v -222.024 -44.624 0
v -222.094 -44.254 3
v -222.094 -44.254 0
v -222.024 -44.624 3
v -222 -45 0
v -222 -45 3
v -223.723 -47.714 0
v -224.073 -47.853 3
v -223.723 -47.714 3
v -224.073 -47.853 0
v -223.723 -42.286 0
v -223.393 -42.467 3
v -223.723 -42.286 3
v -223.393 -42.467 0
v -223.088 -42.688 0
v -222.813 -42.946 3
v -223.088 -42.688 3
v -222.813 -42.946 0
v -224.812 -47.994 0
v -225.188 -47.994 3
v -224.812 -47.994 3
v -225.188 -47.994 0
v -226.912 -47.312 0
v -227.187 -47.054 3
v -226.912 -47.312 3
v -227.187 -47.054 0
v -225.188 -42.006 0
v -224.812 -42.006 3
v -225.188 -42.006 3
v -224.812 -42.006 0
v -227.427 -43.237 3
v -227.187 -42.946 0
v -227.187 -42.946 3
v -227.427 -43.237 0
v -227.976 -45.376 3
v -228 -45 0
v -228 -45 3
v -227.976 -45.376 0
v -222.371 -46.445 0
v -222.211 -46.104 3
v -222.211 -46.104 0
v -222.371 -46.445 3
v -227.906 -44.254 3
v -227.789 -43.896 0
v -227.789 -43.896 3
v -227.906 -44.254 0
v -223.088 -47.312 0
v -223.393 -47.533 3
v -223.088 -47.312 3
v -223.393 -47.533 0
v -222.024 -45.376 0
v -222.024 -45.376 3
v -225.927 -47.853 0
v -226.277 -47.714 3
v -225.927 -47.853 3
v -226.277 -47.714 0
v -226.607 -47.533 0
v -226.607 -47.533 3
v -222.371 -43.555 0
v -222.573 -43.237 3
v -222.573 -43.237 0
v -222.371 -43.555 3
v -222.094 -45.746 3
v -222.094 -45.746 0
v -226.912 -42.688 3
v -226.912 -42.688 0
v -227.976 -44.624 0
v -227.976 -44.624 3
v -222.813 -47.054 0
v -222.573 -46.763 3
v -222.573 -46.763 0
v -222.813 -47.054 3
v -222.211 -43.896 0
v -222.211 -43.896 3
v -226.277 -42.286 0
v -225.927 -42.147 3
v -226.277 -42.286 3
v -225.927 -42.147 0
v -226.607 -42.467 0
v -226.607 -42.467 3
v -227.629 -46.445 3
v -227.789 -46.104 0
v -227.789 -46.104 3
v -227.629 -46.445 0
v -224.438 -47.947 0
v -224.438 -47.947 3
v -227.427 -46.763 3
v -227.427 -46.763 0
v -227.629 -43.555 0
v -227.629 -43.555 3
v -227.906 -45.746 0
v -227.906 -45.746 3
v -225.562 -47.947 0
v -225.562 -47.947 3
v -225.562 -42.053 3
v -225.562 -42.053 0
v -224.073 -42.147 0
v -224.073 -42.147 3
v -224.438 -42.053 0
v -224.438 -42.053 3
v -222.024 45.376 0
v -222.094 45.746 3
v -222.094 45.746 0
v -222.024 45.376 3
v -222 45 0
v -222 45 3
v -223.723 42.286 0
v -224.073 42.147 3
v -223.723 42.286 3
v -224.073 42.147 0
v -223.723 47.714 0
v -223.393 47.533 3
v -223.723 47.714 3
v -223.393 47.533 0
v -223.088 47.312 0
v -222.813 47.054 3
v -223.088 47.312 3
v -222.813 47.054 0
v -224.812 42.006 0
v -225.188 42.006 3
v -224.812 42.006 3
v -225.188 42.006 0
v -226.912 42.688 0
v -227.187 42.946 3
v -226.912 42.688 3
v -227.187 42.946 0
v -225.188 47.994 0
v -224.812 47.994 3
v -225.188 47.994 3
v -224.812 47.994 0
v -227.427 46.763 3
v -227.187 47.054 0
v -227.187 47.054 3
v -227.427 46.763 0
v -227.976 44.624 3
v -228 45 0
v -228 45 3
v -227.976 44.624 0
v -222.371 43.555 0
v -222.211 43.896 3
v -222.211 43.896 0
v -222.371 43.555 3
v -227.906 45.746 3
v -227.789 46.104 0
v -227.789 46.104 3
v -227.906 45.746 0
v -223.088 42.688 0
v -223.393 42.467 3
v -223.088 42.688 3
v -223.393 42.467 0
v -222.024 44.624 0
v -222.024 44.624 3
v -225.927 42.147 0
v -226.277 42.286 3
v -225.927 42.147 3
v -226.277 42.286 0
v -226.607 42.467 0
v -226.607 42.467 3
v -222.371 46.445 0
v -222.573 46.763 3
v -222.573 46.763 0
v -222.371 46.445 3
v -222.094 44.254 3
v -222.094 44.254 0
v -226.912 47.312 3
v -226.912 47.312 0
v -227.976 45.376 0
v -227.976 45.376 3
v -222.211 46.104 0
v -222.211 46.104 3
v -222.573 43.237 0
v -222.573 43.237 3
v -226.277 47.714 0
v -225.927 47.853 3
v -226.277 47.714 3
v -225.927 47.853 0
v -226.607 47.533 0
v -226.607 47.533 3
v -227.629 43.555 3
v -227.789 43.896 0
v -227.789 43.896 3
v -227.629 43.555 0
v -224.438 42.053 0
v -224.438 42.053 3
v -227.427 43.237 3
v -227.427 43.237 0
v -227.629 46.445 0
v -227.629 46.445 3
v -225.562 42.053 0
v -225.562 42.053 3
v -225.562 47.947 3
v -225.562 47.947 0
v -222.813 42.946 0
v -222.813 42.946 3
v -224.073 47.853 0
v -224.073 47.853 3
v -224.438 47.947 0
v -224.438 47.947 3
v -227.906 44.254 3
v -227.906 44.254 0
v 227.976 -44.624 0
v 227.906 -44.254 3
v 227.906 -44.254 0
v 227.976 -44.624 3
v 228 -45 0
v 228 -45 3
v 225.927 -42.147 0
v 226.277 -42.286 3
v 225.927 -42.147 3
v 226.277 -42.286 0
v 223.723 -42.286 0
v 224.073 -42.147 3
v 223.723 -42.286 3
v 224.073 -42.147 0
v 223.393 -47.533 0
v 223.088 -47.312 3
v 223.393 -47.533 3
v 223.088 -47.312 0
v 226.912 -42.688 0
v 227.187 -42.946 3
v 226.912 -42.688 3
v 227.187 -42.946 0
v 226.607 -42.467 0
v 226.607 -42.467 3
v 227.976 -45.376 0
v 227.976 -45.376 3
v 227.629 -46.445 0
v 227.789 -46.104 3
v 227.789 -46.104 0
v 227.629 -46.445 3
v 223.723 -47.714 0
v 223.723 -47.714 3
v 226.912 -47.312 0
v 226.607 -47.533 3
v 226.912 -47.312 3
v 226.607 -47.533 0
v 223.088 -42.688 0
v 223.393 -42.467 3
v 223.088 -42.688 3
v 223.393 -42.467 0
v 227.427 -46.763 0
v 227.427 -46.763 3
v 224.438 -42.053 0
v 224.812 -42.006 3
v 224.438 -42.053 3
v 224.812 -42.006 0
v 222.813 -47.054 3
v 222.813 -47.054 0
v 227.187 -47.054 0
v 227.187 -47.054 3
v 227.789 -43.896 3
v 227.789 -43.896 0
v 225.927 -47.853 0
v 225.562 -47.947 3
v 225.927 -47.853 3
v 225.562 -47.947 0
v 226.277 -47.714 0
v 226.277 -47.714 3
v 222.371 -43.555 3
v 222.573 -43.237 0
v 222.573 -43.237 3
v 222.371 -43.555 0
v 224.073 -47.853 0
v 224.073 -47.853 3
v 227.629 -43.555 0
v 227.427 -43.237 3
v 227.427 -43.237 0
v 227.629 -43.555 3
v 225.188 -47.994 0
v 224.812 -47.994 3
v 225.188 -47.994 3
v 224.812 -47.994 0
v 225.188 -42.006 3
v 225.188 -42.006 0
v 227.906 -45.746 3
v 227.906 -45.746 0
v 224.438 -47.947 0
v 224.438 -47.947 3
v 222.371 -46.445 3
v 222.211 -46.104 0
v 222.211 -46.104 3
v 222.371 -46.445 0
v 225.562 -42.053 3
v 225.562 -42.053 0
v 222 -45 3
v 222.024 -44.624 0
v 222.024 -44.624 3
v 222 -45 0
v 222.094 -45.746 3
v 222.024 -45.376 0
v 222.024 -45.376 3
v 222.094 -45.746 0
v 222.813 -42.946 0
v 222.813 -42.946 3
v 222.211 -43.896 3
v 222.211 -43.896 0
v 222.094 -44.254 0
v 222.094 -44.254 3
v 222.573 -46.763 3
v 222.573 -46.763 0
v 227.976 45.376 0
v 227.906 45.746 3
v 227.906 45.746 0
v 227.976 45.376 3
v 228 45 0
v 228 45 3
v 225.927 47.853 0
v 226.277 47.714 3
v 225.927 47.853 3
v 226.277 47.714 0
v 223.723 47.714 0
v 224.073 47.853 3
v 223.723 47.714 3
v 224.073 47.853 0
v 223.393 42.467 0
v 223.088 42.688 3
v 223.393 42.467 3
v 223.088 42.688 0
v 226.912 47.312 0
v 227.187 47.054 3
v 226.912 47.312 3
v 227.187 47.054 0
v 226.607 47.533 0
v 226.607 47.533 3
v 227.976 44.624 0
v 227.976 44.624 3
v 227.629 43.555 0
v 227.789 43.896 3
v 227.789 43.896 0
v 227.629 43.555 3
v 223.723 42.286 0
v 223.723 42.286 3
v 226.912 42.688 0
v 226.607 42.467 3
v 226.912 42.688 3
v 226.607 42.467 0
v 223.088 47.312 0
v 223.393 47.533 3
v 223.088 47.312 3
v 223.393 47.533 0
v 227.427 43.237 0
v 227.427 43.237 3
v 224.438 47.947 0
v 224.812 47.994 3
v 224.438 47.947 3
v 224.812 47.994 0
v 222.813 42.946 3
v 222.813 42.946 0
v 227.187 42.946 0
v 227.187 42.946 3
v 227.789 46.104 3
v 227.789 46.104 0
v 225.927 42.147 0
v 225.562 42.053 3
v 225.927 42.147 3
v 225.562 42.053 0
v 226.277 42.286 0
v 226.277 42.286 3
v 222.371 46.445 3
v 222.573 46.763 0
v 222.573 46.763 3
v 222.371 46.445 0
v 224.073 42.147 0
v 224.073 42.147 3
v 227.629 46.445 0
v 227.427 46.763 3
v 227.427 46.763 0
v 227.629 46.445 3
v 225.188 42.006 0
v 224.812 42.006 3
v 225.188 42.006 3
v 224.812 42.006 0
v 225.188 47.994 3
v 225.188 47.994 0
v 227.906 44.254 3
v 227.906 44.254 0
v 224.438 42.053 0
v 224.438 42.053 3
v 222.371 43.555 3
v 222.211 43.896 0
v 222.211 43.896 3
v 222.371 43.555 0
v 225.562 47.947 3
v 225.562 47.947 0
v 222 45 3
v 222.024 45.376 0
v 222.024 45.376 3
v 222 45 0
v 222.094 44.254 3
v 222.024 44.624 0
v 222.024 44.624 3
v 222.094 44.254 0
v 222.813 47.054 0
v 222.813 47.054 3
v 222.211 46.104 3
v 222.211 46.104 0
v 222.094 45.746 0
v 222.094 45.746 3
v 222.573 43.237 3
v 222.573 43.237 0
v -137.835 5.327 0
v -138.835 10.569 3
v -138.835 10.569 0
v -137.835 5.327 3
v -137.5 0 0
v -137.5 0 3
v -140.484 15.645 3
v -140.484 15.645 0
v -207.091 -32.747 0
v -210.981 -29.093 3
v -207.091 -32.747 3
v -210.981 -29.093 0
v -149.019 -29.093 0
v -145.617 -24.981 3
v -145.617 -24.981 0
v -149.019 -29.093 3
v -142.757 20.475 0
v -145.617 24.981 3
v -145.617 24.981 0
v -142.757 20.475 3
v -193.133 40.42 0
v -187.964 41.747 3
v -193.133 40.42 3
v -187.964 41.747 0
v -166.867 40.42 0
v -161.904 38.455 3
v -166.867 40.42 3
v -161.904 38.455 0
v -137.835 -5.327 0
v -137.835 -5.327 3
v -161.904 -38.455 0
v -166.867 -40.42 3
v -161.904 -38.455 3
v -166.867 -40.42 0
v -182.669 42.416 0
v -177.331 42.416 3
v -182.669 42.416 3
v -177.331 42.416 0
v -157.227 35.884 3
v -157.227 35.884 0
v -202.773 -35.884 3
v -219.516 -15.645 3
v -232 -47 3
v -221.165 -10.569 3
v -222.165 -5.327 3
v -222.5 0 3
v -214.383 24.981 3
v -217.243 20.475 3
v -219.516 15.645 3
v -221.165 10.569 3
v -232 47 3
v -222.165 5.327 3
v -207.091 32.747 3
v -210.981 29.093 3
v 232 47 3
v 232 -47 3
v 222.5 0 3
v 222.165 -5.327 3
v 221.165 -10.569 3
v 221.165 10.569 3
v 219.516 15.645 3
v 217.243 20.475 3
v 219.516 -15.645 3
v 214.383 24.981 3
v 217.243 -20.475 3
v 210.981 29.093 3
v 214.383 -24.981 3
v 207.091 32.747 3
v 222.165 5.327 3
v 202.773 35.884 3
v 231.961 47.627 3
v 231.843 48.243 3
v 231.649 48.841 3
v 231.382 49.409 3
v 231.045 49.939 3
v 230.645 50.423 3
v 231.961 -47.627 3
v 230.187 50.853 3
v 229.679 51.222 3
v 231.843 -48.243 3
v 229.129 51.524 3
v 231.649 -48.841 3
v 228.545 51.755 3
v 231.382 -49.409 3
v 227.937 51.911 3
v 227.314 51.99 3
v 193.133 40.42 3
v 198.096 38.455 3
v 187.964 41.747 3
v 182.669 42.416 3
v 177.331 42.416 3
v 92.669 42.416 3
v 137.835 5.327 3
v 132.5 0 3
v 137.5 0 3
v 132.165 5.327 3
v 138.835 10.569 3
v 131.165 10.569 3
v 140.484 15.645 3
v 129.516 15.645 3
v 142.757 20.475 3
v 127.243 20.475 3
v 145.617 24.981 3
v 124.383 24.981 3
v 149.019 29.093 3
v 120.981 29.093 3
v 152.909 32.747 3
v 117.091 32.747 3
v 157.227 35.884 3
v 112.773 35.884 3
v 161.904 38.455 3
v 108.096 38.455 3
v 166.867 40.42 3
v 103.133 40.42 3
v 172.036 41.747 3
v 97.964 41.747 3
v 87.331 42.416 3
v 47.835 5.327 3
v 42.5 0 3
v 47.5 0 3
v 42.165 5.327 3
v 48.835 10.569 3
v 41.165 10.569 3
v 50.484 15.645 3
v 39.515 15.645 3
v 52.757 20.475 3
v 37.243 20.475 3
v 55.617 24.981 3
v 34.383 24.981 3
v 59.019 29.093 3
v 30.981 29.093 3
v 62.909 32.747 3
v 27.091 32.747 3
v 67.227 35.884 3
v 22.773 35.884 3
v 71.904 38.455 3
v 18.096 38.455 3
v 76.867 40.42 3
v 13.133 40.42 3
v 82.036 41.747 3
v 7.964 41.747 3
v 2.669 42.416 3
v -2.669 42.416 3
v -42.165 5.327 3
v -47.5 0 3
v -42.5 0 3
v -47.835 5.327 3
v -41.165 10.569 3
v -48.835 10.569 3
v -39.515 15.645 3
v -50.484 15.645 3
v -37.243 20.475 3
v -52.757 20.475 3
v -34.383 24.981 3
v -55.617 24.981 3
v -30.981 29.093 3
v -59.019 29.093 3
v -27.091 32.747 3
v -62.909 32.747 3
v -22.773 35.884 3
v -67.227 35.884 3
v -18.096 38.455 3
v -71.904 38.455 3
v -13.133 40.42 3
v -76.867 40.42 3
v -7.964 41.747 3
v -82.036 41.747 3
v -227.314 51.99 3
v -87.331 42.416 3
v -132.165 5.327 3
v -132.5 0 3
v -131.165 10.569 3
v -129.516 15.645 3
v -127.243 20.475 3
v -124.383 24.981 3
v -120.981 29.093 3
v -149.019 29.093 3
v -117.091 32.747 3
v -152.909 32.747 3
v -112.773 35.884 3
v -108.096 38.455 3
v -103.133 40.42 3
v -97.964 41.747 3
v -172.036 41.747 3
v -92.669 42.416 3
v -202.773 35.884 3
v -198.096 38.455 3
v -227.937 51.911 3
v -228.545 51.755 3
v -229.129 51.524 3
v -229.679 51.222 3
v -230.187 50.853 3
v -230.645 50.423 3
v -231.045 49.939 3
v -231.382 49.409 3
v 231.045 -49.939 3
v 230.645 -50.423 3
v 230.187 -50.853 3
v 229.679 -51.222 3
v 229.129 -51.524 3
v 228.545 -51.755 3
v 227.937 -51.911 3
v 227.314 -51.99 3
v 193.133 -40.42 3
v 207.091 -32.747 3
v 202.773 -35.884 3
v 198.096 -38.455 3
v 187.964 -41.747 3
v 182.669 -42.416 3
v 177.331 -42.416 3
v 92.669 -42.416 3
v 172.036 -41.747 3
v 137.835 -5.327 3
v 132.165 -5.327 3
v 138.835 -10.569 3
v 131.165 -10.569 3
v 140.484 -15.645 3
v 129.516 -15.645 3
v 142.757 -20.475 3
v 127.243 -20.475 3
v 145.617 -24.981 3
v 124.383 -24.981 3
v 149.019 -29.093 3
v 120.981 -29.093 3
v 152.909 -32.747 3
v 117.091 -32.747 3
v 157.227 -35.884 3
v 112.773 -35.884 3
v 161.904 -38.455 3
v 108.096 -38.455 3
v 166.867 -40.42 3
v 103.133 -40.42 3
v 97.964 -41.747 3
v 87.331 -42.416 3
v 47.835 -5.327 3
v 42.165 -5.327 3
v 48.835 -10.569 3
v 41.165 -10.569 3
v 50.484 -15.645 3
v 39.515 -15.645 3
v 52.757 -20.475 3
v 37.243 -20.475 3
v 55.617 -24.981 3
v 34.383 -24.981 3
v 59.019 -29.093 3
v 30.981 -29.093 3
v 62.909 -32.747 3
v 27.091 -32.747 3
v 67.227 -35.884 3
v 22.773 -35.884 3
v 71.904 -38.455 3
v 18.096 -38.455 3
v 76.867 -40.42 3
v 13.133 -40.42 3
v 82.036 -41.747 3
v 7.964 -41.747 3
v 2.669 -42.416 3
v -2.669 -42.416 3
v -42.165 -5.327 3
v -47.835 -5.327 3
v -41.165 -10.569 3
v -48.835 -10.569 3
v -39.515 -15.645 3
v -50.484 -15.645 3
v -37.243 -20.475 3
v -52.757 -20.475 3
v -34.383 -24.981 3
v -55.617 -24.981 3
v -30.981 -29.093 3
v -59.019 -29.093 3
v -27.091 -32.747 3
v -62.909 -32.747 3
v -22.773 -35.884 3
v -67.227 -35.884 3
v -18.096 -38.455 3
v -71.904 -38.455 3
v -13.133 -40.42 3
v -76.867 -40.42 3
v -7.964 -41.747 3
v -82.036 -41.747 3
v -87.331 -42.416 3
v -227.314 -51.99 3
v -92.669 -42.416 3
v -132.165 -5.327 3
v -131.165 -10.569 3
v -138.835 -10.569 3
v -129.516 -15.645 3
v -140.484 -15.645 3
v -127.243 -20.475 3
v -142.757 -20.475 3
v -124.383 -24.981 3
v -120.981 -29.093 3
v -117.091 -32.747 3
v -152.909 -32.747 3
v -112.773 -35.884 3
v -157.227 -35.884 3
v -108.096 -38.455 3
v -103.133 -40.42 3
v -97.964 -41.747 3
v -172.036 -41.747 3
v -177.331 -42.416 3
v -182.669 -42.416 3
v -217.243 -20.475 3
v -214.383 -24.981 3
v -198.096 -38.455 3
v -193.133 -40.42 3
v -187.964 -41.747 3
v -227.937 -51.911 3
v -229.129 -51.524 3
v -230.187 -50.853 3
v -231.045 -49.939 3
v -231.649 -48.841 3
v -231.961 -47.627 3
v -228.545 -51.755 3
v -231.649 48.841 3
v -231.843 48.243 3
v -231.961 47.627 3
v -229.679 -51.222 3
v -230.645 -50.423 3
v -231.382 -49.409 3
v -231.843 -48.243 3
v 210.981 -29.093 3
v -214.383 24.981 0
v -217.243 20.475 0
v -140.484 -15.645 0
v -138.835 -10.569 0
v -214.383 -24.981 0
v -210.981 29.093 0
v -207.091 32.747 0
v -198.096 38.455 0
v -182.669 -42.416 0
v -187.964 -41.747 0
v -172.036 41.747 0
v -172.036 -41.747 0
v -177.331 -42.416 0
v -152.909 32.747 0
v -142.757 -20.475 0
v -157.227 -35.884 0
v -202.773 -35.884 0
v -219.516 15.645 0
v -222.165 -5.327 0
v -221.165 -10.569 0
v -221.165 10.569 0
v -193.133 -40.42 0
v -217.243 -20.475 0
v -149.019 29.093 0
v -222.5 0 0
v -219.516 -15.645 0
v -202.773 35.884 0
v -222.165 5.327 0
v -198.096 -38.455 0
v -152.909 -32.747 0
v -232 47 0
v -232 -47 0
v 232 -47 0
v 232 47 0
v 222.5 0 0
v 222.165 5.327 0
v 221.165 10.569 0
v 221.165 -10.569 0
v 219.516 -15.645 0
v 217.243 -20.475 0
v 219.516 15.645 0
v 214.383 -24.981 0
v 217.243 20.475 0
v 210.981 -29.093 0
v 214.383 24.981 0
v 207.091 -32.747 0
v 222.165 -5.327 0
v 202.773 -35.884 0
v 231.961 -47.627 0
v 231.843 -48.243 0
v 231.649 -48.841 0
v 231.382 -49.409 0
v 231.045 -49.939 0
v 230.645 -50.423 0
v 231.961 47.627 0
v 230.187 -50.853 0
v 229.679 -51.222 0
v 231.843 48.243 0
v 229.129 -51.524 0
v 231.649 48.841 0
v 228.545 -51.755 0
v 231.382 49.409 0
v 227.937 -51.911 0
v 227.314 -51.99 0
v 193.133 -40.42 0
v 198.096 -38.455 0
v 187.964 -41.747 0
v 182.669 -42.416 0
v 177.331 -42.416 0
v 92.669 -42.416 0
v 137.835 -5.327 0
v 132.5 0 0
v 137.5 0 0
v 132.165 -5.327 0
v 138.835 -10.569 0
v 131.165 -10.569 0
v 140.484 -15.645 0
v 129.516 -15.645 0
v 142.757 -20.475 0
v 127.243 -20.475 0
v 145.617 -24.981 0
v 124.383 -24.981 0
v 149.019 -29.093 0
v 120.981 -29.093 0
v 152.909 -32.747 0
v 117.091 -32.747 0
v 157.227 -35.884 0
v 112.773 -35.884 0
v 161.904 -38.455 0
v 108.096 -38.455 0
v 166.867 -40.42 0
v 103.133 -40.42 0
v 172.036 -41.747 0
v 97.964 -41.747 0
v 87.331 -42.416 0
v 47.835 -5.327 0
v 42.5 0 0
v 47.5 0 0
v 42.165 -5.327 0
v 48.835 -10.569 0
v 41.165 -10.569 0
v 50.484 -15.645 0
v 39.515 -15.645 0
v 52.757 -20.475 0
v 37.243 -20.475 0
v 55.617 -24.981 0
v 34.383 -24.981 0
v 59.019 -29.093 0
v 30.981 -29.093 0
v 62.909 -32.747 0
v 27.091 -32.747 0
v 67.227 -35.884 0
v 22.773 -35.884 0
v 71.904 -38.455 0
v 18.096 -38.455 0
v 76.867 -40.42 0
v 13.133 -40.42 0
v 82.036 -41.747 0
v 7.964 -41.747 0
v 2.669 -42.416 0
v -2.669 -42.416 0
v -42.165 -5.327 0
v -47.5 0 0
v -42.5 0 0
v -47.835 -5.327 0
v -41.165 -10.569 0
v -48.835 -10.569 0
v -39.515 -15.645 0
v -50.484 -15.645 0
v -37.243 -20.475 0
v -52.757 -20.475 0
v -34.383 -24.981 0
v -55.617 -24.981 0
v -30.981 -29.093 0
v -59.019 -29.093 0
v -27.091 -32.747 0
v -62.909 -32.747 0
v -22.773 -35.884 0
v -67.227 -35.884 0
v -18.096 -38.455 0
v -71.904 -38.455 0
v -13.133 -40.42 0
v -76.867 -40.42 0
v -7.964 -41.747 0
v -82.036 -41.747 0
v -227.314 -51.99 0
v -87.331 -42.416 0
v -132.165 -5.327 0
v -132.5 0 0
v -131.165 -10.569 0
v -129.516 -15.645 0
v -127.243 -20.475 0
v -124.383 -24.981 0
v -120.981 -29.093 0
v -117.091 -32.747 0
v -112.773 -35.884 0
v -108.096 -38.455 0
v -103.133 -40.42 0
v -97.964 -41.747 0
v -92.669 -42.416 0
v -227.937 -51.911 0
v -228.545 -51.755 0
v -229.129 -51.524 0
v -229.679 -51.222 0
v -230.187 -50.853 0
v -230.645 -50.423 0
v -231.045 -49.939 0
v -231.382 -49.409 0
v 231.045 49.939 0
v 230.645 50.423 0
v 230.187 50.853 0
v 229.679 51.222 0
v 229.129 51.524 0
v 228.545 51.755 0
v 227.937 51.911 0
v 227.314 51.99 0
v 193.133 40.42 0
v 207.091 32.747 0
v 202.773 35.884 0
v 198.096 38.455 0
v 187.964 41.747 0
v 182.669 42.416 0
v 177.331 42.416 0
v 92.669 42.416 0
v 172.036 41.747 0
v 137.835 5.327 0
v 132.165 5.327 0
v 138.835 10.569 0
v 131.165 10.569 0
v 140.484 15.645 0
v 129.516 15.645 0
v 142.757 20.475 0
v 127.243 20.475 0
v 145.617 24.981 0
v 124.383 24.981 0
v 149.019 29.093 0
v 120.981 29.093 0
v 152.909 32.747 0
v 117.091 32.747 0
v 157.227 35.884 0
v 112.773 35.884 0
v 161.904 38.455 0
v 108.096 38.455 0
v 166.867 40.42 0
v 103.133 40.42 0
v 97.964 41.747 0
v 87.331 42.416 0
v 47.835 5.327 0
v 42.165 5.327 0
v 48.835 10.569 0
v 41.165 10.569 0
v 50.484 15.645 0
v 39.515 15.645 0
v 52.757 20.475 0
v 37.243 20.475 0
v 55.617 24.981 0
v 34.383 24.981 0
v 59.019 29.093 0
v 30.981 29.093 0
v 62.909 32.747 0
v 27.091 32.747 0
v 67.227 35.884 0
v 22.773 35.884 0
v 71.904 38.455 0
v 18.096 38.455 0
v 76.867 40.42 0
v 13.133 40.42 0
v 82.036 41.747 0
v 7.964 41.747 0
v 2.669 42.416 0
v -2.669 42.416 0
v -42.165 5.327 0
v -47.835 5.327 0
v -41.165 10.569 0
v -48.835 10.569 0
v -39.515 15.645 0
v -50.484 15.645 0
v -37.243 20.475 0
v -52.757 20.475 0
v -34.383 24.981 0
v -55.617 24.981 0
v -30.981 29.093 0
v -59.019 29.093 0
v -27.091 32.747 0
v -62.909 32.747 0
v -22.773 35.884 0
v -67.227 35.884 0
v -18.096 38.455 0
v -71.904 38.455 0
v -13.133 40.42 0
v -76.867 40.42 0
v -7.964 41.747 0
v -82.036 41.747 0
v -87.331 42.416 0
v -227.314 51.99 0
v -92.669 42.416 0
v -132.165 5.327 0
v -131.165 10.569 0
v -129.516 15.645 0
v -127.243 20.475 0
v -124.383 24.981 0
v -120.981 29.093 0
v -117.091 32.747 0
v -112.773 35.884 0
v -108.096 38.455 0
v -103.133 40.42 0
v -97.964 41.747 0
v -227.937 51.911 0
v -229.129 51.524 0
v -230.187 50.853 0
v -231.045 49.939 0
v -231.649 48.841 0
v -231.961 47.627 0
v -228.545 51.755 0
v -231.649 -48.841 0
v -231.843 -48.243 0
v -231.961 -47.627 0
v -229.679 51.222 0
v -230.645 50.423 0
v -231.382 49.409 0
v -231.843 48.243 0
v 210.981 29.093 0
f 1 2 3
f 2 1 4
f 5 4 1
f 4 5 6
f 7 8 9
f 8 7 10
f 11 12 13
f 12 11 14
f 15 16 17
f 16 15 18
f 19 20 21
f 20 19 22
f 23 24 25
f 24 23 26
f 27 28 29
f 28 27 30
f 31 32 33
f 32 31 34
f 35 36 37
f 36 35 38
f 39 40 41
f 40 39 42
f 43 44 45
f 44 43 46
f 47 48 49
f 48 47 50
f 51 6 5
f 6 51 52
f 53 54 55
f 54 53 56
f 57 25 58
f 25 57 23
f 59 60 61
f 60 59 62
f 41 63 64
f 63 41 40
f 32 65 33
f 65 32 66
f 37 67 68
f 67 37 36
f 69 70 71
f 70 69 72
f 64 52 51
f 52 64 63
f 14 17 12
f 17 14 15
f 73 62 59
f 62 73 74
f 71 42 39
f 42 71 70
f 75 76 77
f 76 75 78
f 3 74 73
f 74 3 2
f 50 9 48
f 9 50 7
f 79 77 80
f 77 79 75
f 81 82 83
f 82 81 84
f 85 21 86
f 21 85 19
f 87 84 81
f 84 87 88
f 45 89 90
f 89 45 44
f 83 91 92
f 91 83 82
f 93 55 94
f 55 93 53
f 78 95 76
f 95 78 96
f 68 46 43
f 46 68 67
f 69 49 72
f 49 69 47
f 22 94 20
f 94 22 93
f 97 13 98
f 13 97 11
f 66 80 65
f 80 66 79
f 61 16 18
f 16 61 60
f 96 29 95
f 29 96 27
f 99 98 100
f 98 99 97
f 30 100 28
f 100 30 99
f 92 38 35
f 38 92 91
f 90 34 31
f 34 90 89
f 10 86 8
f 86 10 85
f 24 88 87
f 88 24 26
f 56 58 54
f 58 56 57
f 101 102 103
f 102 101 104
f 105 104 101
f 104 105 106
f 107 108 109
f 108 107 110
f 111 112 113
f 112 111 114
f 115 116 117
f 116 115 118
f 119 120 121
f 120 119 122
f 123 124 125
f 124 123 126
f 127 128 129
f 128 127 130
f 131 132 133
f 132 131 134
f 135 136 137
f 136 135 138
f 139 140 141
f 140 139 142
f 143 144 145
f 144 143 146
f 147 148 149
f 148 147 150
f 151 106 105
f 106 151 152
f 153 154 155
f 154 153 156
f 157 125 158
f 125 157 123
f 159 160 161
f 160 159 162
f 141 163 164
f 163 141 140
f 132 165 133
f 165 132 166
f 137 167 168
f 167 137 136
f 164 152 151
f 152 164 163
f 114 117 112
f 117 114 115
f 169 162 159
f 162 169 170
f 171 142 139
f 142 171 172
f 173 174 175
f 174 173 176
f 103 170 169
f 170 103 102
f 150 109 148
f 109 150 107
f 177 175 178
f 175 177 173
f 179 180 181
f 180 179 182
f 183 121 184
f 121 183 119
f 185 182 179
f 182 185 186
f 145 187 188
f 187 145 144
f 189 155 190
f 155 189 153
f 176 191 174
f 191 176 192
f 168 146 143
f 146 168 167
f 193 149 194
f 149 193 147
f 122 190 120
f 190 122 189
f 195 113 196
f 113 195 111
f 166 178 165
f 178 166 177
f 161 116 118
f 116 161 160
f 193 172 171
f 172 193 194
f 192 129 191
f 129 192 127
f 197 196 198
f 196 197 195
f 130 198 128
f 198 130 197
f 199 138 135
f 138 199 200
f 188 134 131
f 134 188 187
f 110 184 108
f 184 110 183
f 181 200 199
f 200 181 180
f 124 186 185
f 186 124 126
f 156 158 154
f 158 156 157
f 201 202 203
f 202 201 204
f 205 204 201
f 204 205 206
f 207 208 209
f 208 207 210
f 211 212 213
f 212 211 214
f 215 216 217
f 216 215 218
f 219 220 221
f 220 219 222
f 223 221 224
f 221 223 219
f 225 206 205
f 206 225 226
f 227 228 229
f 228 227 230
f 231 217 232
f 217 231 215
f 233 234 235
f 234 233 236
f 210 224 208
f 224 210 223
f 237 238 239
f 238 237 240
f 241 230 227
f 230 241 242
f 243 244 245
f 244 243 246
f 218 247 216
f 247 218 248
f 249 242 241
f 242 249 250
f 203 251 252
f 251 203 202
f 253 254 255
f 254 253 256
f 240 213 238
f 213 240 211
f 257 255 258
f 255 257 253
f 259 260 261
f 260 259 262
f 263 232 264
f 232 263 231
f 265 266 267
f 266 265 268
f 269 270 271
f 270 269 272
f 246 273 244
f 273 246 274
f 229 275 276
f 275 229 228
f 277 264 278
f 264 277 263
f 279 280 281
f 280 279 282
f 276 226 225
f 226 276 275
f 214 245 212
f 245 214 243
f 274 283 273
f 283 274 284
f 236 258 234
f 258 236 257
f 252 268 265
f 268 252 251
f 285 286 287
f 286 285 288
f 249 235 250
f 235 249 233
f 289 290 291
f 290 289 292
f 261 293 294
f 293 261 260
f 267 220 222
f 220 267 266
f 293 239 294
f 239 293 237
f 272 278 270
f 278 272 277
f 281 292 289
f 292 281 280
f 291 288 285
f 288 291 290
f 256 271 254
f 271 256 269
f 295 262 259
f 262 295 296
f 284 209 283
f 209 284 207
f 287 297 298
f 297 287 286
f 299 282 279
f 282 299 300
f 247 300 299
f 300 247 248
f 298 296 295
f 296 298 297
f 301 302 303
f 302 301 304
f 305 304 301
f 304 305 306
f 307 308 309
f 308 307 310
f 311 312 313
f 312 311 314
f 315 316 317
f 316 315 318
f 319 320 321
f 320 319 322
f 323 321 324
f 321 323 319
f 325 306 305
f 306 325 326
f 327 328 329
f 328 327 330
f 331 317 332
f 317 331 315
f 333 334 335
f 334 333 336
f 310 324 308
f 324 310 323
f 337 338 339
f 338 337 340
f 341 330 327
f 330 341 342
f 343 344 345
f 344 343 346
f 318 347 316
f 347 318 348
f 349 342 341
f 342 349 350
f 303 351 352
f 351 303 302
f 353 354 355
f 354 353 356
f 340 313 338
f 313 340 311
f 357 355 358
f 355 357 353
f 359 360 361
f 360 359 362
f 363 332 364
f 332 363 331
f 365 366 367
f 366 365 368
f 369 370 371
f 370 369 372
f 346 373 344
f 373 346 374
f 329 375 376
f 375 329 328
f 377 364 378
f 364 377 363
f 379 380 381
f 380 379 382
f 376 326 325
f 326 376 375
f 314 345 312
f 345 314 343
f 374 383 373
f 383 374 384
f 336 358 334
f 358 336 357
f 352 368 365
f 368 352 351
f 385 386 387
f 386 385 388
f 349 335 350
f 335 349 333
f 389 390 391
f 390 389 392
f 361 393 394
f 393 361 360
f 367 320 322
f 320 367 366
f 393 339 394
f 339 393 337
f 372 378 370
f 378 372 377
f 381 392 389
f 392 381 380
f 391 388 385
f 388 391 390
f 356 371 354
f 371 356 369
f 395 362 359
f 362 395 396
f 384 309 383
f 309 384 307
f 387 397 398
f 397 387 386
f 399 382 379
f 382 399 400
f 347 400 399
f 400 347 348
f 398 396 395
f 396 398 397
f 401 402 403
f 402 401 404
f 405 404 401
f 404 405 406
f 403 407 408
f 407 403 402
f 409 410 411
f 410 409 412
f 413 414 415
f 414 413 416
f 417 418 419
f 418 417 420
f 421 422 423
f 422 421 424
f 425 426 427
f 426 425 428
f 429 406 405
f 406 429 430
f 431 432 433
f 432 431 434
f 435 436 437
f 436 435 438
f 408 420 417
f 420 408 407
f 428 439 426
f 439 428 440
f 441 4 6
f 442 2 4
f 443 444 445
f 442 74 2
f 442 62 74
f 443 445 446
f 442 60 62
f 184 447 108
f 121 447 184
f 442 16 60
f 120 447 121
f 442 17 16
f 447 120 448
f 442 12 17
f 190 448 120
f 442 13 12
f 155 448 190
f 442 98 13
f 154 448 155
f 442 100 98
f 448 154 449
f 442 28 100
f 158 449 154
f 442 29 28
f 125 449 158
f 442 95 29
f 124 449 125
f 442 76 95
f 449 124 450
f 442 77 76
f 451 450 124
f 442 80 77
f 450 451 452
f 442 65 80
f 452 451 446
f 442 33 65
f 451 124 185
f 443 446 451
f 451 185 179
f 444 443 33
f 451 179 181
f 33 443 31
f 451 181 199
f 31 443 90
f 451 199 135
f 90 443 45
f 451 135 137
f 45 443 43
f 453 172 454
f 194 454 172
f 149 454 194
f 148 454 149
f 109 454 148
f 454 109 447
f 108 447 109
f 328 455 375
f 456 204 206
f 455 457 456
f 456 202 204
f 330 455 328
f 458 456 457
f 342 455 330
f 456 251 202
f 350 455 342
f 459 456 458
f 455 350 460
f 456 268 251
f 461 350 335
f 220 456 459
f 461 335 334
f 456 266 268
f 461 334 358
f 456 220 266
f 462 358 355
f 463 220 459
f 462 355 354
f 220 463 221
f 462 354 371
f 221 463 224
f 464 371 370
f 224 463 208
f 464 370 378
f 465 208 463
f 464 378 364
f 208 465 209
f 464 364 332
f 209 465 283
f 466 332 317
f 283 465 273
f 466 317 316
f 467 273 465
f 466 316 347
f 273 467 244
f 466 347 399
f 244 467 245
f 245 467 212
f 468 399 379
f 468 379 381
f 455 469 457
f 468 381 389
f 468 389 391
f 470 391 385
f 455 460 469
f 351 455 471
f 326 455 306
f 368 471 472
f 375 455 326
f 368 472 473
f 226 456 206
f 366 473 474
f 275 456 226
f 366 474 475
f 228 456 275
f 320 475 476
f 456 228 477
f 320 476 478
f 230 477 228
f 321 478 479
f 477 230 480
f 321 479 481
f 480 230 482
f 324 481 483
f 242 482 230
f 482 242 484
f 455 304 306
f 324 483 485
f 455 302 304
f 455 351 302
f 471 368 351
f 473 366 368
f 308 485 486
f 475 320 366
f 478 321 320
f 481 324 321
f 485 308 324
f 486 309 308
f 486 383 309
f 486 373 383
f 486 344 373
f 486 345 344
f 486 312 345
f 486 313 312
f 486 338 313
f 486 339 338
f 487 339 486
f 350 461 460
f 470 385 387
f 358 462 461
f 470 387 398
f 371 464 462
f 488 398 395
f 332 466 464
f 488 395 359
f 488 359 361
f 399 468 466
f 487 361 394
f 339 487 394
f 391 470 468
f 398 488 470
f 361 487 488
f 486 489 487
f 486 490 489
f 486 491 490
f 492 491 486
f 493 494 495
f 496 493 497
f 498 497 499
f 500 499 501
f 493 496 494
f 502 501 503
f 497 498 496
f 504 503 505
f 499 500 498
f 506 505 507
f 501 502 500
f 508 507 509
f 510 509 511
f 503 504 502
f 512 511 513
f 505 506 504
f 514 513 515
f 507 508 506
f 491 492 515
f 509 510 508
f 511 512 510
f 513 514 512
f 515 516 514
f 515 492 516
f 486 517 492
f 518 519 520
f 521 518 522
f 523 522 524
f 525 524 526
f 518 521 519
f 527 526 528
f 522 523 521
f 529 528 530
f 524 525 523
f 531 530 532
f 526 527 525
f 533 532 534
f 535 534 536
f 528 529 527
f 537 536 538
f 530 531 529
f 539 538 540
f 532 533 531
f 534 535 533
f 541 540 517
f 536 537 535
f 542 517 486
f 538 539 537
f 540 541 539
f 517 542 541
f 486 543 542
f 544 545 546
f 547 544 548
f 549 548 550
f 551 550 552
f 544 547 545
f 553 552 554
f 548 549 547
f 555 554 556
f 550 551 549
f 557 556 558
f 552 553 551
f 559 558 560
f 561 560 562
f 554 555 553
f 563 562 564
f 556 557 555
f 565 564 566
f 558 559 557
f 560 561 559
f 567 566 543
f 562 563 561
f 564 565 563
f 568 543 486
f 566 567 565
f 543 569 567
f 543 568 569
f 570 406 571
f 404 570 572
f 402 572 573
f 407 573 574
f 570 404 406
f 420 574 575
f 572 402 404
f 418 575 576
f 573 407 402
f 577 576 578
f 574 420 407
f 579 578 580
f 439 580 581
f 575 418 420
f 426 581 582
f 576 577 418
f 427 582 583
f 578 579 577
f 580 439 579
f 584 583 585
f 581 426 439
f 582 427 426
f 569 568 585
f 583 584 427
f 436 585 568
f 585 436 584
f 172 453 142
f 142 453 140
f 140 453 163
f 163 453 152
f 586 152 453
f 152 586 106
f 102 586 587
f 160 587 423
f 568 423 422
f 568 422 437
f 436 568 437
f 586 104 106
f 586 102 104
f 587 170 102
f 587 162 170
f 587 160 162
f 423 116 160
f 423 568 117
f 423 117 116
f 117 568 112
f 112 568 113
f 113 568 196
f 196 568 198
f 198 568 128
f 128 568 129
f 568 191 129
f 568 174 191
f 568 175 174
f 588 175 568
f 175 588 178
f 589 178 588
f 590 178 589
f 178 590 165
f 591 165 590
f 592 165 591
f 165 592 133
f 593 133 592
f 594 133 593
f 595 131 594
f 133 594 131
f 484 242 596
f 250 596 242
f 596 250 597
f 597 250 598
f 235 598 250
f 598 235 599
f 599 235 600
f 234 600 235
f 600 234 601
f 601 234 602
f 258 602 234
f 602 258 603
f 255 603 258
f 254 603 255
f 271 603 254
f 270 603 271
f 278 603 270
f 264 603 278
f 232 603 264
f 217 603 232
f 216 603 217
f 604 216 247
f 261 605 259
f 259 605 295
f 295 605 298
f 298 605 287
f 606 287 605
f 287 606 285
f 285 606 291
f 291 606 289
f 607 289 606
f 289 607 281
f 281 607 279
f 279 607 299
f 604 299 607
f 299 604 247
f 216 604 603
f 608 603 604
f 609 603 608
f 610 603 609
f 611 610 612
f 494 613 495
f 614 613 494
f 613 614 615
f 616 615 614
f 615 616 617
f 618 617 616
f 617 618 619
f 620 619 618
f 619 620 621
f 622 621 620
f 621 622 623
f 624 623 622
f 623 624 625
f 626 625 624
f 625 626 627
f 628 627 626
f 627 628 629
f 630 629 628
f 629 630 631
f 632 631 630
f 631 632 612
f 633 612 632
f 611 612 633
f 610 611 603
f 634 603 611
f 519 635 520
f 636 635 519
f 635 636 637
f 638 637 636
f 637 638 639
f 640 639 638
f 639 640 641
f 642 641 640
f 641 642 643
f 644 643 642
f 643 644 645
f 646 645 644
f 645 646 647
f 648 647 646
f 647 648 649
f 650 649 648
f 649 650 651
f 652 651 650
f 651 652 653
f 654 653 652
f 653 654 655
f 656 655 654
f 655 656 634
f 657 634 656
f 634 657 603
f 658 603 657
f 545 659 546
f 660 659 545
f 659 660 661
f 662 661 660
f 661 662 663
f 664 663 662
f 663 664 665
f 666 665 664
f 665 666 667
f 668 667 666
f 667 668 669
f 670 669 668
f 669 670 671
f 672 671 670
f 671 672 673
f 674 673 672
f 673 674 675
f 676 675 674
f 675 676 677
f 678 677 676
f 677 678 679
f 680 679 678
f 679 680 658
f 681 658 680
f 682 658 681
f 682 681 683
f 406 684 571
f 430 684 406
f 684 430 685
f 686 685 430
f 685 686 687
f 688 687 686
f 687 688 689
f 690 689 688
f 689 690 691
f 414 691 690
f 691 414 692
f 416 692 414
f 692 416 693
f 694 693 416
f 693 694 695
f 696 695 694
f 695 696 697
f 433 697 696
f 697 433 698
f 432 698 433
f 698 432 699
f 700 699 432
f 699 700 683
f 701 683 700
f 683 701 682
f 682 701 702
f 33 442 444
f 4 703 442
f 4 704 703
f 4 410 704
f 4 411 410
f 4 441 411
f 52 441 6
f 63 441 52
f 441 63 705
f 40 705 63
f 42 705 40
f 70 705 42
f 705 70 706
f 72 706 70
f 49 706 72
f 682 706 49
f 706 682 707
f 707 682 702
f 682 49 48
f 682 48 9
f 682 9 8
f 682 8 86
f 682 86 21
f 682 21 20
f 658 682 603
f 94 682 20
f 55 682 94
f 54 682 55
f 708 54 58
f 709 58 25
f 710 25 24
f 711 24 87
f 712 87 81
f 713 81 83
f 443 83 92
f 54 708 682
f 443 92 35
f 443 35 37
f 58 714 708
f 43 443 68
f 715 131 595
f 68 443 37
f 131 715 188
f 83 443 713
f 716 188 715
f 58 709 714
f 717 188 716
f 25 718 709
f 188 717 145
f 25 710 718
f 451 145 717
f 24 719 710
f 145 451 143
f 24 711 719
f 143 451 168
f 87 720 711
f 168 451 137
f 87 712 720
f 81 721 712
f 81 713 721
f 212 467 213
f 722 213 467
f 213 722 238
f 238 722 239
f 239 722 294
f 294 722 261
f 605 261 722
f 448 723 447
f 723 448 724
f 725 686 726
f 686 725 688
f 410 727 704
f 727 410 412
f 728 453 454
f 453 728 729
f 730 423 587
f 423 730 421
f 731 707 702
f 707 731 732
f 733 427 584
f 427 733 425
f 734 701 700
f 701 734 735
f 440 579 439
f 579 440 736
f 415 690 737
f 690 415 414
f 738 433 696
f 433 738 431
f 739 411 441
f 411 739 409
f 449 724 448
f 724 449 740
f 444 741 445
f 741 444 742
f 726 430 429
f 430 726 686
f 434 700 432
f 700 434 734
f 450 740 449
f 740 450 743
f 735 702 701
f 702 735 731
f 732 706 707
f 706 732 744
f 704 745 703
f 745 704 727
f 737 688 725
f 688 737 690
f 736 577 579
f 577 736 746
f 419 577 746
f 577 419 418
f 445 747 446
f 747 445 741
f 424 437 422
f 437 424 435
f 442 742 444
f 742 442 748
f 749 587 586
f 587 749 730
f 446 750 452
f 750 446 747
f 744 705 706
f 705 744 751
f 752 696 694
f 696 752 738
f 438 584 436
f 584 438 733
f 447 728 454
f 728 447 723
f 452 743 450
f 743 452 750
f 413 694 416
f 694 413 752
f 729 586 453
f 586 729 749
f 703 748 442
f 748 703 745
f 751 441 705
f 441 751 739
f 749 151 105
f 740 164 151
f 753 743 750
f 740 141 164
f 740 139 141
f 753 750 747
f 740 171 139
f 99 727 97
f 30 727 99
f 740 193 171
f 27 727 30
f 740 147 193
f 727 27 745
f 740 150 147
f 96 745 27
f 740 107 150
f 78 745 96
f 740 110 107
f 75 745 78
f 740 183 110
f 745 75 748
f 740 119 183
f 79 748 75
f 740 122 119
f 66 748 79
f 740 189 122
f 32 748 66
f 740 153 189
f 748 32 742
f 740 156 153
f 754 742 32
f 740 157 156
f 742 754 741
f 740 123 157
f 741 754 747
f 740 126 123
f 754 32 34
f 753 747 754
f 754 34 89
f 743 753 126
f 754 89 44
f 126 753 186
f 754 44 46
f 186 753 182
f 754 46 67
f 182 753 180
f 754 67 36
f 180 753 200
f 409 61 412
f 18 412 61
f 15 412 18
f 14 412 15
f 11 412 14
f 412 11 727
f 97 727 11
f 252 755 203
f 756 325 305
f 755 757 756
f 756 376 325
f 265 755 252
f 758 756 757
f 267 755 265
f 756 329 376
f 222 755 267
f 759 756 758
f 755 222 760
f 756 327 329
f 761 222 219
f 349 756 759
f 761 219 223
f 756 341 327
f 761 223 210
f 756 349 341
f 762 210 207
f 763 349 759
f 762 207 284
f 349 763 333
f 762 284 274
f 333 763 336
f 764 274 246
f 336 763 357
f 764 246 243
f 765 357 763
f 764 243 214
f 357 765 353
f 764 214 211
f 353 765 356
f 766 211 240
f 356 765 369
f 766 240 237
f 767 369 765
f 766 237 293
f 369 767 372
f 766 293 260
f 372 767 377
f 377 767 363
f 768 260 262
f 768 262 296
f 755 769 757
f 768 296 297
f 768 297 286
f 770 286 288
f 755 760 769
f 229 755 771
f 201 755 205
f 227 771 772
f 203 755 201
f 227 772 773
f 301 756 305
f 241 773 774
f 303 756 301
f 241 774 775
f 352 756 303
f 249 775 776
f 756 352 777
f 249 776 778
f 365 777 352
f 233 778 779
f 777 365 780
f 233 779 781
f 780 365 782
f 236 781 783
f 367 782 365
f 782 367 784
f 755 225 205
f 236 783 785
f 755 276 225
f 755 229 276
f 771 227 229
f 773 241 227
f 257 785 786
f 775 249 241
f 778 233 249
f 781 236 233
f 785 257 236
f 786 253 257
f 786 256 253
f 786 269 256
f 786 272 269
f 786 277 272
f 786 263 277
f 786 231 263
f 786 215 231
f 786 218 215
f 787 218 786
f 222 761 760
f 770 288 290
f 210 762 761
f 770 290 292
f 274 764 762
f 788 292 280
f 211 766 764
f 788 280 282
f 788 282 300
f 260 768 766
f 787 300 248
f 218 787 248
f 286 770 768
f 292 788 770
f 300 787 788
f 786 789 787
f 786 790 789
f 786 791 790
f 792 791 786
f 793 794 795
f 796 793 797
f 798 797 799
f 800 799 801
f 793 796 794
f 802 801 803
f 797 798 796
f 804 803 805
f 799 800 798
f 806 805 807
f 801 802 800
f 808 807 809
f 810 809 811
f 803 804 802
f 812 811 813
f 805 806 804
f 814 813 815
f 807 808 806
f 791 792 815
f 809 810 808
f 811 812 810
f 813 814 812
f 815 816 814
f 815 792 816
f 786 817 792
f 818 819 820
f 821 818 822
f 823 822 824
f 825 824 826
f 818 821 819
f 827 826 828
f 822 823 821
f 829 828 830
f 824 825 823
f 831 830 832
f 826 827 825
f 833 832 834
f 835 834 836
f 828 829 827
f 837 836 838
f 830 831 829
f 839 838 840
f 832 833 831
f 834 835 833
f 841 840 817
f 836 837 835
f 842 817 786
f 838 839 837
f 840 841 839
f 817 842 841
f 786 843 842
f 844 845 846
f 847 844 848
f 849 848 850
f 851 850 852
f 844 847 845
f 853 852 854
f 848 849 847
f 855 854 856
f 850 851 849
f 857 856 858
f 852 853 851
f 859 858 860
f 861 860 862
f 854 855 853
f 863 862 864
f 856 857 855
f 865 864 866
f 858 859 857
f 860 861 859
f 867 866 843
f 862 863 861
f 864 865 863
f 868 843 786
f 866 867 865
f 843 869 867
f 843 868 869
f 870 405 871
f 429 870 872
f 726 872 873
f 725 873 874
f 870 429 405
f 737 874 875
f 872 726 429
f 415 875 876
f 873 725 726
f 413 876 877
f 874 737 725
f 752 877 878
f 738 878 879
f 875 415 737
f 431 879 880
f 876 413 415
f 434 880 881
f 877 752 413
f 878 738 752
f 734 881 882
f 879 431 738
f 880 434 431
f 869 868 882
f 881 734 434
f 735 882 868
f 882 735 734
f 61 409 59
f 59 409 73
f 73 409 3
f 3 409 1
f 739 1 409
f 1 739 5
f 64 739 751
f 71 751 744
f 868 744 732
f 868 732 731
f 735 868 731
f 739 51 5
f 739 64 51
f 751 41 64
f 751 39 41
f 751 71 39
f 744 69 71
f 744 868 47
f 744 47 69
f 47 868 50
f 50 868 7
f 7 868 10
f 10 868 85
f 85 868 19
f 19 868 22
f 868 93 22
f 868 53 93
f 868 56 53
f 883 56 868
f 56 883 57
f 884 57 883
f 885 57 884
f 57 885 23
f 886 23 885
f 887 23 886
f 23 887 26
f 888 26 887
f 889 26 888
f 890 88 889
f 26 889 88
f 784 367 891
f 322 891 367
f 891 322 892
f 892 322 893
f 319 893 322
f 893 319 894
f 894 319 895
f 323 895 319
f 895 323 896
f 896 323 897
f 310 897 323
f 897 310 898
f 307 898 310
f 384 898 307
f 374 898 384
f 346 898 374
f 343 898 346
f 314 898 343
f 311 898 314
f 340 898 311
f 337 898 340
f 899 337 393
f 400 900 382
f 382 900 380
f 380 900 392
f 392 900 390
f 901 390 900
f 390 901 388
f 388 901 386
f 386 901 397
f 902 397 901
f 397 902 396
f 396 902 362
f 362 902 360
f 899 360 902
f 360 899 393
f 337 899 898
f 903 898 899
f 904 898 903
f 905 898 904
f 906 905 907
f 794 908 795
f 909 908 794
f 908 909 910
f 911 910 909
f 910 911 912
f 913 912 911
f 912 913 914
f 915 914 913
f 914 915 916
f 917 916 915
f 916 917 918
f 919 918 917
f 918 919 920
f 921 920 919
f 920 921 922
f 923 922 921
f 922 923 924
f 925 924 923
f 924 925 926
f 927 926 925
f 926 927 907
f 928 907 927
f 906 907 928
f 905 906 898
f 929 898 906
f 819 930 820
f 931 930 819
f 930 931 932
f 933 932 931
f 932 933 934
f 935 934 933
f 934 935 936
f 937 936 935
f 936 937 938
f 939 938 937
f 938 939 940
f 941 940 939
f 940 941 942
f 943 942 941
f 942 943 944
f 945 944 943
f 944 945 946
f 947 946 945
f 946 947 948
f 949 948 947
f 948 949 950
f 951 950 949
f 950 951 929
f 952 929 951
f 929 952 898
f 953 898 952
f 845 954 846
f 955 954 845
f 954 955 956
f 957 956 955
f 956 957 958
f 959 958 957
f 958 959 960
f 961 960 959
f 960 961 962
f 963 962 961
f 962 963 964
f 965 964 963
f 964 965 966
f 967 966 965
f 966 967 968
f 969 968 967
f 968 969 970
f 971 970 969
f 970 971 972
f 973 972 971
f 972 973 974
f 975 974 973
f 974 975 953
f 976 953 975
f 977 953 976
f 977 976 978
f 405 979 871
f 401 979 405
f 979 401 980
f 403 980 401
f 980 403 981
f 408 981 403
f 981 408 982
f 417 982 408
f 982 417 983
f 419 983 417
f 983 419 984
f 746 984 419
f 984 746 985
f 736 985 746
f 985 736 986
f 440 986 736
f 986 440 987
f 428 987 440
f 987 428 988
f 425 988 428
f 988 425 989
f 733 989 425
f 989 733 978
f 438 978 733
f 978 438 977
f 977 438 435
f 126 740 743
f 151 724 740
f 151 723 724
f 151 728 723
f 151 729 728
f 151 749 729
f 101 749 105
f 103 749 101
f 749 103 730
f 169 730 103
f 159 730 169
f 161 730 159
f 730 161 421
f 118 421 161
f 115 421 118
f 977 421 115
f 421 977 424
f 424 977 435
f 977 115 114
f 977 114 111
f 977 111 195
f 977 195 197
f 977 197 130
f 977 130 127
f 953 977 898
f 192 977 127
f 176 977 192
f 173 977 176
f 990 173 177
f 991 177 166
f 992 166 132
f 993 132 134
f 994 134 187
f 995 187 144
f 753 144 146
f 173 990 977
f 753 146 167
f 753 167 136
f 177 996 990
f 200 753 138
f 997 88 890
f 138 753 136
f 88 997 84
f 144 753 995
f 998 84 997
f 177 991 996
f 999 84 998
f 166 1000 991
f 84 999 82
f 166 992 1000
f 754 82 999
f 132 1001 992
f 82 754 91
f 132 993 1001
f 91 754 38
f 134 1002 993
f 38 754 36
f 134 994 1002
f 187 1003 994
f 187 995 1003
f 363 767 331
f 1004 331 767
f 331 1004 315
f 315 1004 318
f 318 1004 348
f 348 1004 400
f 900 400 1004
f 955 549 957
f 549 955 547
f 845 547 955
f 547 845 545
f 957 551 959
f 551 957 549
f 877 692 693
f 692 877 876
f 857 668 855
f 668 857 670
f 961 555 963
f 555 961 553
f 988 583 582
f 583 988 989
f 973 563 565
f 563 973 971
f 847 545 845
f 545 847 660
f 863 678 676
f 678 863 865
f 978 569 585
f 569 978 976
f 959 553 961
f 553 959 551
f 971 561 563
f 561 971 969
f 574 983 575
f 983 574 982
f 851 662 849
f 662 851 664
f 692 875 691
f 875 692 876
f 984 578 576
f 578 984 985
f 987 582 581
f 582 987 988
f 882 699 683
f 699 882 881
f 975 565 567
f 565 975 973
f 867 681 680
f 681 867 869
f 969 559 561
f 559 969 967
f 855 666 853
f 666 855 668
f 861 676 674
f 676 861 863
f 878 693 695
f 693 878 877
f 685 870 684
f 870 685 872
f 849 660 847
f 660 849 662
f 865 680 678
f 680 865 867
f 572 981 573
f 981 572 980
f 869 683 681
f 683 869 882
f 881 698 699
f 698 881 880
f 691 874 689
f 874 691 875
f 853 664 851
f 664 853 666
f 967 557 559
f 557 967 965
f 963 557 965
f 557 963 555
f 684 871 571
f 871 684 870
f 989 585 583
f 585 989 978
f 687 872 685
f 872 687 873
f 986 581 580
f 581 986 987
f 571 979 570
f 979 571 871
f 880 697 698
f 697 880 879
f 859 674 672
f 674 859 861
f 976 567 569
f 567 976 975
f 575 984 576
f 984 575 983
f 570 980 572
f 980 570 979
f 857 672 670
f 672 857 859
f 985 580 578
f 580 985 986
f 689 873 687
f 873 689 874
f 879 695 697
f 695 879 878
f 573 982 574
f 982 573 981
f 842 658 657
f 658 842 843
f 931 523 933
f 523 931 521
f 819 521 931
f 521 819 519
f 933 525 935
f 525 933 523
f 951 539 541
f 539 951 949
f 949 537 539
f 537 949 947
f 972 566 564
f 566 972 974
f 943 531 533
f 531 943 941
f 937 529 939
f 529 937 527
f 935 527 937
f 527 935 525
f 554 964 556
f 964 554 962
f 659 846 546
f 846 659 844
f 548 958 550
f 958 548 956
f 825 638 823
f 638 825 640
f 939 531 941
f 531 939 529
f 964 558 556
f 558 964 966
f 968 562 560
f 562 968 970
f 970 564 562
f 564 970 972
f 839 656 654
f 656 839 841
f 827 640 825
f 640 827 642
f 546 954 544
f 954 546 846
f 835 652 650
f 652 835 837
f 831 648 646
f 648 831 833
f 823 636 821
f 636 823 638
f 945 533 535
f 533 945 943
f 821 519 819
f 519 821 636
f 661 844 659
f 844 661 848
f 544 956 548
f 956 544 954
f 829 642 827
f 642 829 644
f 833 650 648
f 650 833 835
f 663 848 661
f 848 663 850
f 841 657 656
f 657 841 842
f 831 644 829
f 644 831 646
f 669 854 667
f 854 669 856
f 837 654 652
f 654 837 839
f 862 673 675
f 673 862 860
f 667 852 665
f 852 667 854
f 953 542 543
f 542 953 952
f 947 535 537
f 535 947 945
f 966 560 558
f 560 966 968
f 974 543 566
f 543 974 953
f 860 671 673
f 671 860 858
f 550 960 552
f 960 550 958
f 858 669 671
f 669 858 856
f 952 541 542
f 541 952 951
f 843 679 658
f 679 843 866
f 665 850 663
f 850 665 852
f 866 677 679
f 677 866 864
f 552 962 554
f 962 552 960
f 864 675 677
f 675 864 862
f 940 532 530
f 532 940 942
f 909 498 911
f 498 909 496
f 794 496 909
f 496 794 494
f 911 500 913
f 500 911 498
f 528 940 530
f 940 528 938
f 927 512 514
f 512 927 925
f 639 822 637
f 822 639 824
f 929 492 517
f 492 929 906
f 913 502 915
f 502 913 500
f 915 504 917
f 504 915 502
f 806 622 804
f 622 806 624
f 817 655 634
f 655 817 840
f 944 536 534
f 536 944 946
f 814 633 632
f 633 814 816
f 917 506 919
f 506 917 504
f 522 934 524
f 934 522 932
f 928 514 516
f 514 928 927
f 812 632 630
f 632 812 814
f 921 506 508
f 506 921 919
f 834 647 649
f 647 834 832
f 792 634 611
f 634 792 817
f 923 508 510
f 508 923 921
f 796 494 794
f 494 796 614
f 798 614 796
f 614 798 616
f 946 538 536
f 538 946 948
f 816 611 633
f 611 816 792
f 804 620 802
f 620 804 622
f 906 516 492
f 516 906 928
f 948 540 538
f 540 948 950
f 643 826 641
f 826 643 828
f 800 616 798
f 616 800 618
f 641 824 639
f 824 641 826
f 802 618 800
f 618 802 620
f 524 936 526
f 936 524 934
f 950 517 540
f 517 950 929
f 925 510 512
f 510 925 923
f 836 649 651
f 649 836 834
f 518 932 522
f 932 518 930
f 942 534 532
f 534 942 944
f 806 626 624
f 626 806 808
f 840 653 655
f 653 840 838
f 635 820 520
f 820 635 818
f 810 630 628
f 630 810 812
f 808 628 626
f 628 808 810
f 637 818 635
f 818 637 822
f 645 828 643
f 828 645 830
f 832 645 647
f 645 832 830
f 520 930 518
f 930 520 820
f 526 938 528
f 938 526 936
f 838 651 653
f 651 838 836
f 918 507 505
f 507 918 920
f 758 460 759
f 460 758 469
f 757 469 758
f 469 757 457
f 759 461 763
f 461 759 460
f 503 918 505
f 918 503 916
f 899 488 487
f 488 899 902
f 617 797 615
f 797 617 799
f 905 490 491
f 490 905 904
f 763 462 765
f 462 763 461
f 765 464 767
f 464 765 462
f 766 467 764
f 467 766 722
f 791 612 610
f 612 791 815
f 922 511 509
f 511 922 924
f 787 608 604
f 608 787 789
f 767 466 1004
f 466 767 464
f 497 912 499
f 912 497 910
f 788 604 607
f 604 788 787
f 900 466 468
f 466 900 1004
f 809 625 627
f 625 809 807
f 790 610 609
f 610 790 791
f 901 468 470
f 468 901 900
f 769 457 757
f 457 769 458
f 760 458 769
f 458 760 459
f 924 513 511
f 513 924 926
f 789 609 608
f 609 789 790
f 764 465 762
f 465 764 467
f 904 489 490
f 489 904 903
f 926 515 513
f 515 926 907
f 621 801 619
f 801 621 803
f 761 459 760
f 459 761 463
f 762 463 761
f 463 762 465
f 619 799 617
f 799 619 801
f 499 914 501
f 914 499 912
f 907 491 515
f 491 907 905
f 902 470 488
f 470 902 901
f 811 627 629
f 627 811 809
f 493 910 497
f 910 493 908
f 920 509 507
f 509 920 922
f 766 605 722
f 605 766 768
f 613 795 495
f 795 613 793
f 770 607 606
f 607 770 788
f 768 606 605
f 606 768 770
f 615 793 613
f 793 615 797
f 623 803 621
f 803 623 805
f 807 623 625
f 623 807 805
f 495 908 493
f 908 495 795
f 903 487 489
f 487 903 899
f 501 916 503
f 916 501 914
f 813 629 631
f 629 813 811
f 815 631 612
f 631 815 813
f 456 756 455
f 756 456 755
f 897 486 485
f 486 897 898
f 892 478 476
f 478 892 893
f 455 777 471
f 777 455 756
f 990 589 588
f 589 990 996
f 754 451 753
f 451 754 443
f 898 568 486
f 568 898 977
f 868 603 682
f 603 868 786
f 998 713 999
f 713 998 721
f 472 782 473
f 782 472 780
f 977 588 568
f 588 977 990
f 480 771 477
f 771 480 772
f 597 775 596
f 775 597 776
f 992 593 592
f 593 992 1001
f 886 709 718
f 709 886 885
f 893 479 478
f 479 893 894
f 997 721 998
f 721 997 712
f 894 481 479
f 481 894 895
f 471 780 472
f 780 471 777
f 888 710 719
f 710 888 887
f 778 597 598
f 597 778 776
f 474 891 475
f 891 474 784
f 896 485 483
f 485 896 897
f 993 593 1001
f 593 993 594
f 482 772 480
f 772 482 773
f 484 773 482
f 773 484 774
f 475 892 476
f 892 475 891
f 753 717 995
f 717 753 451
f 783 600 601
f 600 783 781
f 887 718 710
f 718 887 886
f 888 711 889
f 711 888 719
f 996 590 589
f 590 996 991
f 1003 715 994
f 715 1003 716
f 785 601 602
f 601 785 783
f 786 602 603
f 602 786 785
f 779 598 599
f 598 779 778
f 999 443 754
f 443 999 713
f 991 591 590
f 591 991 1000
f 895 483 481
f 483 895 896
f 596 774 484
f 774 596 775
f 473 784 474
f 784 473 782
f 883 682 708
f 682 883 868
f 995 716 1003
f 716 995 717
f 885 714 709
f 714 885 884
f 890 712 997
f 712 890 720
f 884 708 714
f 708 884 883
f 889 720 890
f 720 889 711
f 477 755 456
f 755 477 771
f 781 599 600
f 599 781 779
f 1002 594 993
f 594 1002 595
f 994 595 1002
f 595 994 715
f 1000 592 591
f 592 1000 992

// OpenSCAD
$fn = 50;


difference() {
	union() {
		hull() {
			translate(v = [-227.0000000000, 47.0000000000, 0]) {
				cylinder(h = 3, r = 5);
			}
			translate(v = [227.0000000000, 47.0000000000, 0]) {
				cylinder(h = 3, r = 5);
			}
			translate(v = [-227.0000000000, -47.0000000000, 0]) {
				cylinder(h = 3, r = 5);
			}
			translate(v = [227.0000000000, -47.0000000000, 0]) {
				cylinder(h = 3, r = 5);
			}
		}
	}
	union() {
		#translate(v = [-225.0000000000, -45.0000000000, -100.0000000000]) {
			cylinder(h = 200, r = 3.0000000000);
		}
		#translate(v = [-225.0000000000, 45.0000000000, -100.0000000000]) {
			cylinder(h = 200, r = 3.0000000000);
		}
		#translate(v = [225.0000000000, -45.0000000000, -100.0000000000]) {
			cylinder(h = 200, r = 3.0000000000);
		}
		#translate(v = [225.0000000000, 45.0000000000, -100.0000000000]) {
			cylinder(h = 200, r = 3.0000000000);
		}
		#translate(v = [-180.0000000000, 0, 0]) {
			cylinder(h = 3, r = 42.5000000000);
		}
		#translate(v = [-90.0000000000, 0, 0]) {
			cylinder(h = 3, r = 42.5000000000);
		}
		#cylinder(h = 3, r = 42.5000000000);
		#translate(v = [90.0000000000, 0, 0]) {
			cylinder(h = 3, r = 42.5000000000);
		}
		#translate(v = [180.0000000000, 0, 0]) {
			cylinder(h = 3, r = 42.5000000000);
		}
	}
}
